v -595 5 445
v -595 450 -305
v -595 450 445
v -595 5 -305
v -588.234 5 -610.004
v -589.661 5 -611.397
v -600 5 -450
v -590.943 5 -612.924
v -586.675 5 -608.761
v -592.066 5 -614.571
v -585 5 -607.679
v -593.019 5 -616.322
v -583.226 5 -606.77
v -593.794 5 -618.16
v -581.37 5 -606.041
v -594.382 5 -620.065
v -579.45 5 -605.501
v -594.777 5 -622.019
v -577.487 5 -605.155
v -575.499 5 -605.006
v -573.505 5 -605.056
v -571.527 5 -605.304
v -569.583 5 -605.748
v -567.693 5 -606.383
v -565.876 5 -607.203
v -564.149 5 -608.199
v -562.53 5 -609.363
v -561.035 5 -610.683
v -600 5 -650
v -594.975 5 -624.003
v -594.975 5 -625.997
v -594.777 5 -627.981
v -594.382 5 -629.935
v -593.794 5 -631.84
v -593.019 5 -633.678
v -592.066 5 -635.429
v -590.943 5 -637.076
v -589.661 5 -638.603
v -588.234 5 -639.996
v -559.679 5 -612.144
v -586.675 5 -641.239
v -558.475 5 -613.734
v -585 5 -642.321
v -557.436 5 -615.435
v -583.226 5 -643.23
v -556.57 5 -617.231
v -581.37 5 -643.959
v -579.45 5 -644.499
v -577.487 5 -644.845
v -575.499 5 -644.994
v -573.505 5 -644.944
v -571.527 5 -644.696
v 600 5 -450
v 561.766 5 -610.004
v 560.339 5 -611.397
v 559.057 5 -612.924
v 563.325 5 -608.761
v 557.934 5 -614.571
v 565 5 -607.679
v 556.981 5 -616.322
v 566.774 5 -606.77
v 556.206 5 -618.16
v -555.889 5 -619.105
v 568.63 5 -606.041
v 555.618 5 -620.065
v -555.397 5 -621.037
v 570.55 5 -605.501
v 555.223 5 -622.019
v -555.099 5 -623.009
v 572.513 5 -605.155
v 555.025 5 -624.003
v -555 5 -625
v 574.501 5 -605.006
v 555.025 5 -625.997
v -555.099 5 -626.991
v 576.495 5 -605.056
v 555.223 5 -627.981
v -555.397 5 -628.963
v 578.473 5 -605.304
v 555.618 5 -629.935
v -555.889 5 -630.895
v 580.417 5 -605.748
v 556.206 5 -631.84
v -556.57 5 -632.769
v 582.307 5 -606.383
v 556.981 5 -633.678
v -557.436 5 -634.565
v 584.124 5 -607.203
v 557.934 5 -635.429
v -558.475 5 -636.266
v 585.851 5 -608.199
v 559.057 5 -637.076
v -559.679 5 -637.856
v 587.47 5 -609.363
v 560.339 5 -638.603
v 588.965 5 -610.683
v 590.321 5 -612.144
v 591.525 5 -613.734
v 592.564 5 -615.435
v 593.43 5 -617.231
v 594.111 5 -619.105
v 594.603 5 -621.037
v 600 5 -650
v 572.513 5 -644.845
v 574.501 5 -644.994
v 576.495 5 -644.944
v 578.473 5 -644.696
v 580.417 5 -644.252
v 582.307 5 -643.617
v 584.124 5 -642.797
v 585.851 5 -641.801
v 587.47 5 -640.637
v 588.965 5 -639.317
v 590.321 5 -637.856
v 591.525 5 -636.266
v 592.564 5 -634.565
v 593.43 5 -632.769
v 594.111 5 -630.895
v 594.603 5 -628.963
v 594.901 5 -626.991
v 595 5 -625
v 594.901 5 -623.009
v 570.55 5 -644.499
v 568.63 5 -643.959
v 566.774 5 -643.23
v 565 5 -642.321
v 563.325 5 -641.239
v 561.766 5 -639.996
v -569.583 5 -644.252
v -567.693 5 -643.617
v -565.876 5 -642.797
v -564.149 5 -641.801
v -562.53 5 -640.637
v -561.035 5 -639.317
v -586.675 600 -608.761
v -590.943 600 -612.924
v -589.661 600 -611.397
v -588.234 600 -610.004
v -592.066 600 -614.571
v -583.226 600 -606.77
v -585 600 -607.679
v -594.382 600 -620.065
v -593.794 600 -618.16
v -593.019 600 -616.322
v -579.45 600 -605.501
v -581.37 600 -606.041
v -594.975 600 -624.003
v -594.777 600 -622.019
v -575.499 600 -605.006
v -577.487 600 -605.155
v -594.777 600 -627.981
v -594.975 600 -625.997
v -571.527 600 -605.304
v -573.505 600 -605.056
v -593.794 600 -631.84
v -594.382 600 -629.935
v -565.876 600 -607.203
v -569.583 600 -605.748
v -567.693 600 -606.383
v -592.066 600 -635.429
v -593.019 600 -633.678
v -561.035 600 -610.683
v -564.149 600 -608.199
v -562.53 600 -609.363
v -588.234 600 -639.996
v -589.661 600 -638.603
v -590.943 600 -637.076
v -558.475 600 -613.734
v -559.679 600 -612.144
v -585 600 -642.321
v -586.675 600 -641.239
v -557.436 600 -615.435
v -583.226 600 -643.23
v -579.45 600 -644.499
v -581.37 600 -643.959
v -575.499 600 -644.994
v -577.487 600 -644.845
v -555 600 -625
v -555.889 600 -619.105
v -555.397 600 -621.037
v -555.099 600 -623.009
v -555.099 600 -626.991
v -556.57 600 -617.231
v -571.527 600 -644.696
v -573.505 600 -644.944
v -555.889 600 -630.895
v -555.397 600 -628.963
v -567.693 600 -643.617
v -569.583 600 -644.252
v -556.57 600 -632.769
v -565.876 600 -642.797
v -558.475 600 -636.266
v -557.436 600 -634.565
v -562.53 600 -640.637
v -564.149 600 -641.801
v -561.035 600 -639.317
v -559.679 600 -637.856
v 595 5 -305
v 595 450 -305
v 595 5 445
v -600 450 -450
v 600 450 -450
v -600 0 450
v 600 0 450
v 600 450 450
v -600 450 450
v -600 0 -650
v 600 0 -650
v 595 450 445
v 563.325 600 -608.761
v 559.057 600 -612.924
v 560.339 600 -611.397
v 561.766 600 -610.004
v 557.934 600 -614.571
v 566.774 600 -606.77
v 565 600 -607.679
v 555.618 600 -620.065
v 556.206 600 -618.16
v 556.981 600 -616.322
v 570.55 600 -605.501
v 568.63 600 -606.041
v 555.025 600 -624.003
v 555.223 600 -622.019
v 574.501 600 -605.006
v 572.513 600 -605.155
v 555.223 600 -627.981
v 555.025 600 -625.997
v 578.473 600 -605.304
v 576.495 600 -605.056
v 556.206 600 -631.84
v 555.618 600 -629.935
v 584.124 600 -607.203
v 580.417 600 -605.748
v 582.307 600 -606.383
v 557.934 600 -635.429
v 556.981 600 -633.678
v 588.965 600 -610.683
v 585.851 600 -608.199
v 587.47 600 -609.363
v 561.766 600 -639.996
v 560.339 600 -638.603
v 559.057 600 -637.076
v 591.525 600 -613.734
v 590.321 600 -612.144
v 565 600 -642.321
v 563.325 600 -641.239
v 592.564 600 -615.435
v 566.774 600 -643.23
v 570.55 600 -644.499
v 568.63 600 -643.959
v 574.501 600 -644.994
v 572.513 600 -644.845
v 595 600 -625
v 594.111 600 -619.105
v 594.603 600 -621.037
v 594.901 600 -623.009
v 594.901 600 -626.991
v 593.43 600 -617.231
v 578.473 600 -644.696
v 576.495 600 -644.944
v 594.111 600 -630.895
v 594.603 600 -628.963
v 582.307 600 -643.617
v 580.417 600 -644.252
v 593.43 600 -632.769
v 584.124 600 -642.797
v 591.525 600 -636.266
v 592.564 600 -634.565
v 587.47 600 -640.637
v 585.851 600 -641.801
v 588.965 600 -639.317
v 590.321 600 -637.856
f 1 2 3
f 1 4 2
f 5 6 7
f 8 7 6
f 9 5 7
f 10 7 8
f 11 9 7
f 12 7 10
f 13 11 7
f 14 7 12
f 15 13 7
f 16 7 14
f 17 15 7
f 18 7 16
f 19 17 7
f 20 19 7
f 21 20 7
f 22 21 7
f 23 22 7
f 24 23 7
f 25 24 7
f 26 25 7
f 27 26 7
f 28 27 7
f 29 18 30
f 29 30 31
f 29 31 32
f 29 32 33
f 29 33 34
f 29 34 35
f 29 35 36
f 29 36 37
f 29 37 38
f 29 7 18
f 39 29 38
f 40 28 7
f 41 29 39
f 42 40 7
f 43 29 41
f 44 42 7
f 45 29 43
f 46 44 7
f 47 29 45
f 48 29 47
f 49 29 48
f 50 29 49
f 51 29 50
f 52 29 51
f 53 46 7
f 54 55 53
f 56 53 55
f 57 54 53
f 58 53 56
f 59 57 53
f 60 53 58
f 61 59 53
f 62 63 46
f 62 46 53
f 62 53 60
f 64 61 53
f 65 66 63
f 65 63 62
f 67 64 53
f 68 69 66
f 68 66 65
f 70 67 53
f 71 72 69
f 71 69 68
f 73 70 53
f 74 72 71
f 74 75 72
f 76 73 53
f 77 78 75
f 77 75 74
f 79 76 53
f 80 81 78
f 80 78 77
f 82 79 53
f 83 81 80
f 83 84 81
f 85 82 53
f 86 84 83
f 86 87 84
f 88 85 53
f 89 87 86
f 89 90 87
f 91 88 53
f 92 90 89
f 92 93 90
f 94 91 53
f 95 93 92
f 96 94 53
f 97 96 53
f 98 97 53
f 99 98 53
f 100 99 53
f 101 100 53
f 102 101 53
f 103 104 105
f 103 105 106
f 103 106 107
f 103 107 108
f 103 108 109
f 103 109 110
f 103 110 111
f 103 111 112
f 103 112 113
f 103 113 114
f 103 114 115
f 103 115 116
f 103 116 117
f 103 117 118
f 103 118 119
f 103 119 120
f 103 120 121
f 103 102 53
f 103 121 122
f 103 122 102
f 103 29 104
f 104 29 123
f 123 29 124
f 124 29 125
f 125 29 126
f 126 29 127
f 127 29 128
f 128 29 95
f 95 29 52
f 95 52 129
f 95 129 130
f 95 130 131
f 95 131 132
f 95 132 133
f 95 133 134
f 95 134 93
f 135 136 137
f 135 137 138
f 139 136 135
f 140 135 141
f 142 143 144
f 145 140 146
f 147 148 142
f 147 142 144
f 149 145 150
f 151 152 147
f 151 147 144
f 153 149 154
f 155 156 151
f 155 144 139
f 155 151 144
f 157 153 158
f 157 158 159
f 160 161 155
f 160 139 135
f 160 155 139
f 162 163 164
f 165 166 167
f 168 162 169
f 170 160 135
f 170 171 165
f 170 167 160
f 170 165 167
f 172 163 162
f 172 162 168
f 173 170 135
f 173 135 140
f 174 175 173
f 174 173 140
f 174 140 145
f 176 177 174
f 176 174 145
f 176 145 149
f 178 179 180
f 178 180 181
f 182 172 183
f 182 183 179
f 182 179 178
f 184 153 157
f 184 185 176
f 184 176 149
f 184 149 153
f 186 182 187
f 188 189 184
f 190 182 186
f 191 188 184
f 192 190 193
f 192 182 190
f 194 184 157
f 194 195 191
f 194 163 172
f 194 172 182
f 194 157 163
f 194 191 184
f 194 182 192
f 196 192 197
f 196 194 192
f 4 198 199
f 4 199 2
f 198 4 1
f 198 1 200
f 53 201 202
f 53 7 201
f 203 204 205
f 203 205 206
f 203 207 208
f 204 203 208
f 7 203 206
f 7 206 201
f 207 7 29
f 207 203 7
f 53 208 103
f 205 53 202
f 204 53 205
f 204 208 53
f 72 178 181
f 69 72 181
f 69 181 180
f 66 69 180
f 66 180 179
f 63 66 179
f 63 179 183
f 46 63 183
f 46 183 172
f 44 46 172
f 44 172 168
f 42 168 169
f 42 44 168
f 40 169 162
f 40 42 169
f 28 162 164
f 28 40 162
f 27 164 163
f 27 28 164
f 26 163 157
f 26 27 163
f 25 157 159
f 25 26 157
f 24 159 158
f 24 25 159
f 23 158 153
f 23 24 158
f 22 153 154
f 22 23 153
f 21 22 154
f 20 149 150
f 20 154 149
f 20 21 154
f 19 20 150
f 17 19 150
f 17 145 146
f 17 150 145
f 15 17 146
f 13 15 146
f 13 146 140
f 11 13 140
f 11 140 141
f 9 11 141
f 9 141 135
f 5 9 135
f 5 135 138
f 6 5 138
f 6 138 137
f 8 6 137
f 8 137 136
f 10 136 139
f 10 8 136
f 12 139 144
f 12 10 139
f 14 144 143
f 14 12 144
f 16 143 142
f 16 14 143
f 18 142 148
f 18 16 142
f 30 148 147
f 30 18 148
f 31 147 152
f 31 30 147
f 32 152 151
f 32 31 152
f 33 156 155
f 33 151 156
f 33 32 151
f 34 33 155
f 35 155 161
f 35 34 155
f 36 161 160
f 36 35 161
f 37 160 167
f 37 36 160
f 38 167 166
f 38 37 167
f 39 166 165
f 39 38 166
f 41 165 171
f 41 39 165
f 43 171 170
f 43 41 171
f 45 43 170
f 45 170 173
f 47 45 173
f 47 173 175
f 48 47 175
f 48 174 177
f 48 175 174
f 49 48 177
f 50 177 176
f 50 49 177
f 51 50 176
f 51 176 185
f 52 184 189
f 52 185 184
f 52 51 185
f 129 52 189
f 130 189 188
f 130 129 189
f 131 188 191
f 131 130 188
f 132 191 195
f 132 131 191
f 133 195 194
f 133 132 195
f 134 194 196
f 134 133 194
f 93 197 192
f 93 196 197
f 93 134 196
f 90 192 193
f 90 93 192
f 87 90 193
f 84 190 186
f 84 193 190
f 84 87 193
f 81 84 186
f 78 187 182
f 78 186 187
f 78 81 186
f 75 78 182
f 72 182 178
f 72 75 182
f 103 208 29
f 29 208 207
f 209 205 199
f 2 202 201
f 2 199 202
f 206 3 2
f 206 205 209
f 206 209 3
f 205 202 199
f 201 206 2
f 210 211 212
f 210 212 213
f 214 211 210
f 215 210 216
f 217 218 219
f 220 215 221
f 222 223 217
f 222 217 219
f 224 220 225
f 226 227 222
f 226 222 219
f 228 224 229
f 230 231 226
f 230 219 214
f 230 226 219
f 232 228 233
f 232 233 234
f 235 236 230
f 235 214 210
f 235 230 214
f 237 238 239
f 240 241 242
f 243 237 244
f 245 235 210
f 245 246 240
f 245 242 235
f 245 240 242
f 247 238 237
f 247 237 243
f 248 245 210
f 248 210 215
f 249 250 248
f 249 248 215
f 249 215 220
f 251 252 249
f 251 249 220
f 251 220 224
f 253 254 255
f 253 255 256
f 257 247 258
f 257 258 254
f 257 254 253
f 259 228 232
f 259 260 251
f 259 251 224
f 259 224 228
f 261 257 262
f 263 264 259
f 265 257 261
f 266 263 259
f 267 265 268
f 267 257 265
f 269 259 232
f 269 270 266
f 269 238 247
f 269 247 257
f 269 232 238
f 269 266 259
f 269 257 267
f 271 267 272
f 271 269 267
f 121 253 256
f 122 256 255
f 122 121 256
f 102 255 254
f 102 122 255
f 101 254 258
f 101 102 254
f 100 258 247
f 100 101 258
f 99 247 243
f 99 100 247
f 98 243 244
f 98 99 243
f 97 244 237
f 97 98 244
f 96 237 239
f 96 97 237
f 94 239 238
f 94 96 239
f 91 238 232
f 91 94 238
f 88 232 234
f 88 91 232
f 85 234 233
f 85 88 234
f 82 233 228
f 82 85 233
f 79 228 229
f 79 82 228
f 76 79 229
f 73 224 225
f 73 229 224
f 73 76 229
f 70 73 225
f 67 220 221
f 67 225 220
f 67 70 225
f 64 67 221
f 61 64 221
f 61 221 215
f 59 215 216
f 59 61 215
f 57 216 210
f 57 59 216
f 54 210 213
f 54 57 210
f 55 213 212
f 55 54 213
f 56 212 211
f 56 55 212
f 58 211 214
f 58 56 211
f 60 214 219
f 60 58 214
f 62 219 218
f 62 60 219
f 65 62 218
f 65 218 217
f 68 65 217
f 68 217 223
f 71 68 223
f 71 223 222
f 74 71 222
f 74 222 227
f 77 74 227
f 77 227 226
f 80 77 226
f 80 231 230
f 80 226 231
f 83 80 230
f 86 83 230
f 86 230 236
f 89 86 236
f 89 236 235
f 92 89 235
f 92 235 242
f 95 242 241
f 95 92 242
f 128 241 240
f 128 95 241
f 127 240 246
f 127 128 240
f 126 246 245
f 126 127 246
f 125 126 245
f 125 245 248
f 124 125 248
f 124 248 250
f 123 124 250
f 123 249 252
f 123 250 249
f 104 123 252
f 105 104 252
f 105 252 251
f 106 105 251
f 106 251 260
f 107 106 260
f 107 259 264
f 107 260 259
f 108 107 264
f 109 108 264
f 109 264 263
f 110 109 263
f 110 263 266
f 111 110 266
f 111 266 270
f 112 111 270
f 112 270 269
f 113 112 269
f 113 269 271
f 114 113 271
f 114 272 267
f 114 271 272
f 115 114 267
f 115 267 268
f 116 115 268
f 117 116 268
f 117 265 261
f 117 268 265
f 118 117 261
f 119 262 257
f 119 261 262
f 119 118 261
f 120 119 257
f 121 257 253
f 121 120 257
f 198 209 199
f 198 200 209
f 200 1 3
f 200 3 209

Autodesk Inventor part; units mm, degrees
ref_plane "YZ Plane" through (0, 0, 0) normal (1, 0, 0) x (0, 1, 0)
ref_plane "XZ Plane" through (0, 0, 0) normal (0, 1, 0) x (-1, 0, 0)
ref_plane "XY Plane" through (0, 0, 0) normal (0, 0, 1) x (1, 0, 0)
sketch "Sketch1" plane through (0, 0, 0) normal (0, 1, 0) x (-1, 0, 0)
  line L0 (-600, 450) -> (600, 450)
  line L1 (600, 450) -> (600, -450)
  line L2 (600, -450) -> (-600, -450)
  line L3 (-600, -450) -> (-600, 450)
  line L4 (-600, 450) -> (600, -450) construction
  line L5 (600, 450) -> (-600, -450) construction
  line L6 (595, 445) -> (-595, 445)
  line L7 (-595, 445) -> (-595, -305)
  line L8 (-595, -305) -> (595, -305)
  line L9 (595, -305) -> (595, 445)
  point P0 (0, 0)
  dimension "d0" = 1200
  dimension "d1" = 900
  dimension "d2" = 1190
  dimension "d3" = 750
extrude "Extrusion1" add sketch "Sketch1" along normal blind 450
ref_plane "Work Plane3" through (0, 0, 0) normal (0, 1, 0) x (1, 0, 0)
sketch "Sketch4" plane through (0, 0, 0) normal (0, 1, 0) x (1, 0, 0)
  line L0 (600, 450) -> (-600, 450) projected
  line L1 (-600, 450) -> (600, 450)
  line L2 (600, 450) -> (600, 650)
  line L3 (600, 650) -> (-600, 650)
  line L4 (-600, 650) -> (-600, 450)
  circle A0 centre (-575, 625) radius 20
  circle A1 centre (575, 625) radius 20
  point P0 (0, 0)
  dimension "d12" = 1200
  dimension "d13" = 200
  dimension "d14" = 40
  dimension "d15" = 40
extrude "Extrusion2" add sketch "Sketch4" along normal blind 600 contours A0 | A1
ref_plane "Work Plane6" through (0, 0, 0) normal (0, 1, 0) x (1, 0, 0)
sketch "Sketch5" plane through (0, 0, 0) normal (0, 1, 0) x (1, 0, 0)
  line L0 (-600, 450) -> (600, 450)
  line L1 (600, 450) -> (600, 650)
  line L2 (600, 650) -> (-600, 650)
  line L3 (-600, 650) -> (-600, 450)
  point P0 (0, 0)
  dimension "d18" = 1200
  dimension "d19" = 200
extrude "Extrusion3" add sketch "Sketch5" along normal blind 5
ref_plane "Work Plane7" through (0, 0, 0) normal (0, 1, 0) x (1, 0, 0)
sketch "Sketch6" plane through (0, 0, 0) normal (0, 1, 0) x (1, 0, 0)
  line L0 (-595, 305) -> (595, 305) projected
  line L1 (595, -445) -> (-595, -445) projected
  line L2 (595, 305) -> (-595, 305)
  line L3 (-595, 305) -> (-595, -445)
  line L4 (-595, -445) -> (595, -445)
  line L5 (595, -445) -> (595, 305)
  point P0 (0, 0)
extrude "Extrusion4" add sketch "Sketch6" along normal blind 5
properties part number "Distanced Top Bin"
